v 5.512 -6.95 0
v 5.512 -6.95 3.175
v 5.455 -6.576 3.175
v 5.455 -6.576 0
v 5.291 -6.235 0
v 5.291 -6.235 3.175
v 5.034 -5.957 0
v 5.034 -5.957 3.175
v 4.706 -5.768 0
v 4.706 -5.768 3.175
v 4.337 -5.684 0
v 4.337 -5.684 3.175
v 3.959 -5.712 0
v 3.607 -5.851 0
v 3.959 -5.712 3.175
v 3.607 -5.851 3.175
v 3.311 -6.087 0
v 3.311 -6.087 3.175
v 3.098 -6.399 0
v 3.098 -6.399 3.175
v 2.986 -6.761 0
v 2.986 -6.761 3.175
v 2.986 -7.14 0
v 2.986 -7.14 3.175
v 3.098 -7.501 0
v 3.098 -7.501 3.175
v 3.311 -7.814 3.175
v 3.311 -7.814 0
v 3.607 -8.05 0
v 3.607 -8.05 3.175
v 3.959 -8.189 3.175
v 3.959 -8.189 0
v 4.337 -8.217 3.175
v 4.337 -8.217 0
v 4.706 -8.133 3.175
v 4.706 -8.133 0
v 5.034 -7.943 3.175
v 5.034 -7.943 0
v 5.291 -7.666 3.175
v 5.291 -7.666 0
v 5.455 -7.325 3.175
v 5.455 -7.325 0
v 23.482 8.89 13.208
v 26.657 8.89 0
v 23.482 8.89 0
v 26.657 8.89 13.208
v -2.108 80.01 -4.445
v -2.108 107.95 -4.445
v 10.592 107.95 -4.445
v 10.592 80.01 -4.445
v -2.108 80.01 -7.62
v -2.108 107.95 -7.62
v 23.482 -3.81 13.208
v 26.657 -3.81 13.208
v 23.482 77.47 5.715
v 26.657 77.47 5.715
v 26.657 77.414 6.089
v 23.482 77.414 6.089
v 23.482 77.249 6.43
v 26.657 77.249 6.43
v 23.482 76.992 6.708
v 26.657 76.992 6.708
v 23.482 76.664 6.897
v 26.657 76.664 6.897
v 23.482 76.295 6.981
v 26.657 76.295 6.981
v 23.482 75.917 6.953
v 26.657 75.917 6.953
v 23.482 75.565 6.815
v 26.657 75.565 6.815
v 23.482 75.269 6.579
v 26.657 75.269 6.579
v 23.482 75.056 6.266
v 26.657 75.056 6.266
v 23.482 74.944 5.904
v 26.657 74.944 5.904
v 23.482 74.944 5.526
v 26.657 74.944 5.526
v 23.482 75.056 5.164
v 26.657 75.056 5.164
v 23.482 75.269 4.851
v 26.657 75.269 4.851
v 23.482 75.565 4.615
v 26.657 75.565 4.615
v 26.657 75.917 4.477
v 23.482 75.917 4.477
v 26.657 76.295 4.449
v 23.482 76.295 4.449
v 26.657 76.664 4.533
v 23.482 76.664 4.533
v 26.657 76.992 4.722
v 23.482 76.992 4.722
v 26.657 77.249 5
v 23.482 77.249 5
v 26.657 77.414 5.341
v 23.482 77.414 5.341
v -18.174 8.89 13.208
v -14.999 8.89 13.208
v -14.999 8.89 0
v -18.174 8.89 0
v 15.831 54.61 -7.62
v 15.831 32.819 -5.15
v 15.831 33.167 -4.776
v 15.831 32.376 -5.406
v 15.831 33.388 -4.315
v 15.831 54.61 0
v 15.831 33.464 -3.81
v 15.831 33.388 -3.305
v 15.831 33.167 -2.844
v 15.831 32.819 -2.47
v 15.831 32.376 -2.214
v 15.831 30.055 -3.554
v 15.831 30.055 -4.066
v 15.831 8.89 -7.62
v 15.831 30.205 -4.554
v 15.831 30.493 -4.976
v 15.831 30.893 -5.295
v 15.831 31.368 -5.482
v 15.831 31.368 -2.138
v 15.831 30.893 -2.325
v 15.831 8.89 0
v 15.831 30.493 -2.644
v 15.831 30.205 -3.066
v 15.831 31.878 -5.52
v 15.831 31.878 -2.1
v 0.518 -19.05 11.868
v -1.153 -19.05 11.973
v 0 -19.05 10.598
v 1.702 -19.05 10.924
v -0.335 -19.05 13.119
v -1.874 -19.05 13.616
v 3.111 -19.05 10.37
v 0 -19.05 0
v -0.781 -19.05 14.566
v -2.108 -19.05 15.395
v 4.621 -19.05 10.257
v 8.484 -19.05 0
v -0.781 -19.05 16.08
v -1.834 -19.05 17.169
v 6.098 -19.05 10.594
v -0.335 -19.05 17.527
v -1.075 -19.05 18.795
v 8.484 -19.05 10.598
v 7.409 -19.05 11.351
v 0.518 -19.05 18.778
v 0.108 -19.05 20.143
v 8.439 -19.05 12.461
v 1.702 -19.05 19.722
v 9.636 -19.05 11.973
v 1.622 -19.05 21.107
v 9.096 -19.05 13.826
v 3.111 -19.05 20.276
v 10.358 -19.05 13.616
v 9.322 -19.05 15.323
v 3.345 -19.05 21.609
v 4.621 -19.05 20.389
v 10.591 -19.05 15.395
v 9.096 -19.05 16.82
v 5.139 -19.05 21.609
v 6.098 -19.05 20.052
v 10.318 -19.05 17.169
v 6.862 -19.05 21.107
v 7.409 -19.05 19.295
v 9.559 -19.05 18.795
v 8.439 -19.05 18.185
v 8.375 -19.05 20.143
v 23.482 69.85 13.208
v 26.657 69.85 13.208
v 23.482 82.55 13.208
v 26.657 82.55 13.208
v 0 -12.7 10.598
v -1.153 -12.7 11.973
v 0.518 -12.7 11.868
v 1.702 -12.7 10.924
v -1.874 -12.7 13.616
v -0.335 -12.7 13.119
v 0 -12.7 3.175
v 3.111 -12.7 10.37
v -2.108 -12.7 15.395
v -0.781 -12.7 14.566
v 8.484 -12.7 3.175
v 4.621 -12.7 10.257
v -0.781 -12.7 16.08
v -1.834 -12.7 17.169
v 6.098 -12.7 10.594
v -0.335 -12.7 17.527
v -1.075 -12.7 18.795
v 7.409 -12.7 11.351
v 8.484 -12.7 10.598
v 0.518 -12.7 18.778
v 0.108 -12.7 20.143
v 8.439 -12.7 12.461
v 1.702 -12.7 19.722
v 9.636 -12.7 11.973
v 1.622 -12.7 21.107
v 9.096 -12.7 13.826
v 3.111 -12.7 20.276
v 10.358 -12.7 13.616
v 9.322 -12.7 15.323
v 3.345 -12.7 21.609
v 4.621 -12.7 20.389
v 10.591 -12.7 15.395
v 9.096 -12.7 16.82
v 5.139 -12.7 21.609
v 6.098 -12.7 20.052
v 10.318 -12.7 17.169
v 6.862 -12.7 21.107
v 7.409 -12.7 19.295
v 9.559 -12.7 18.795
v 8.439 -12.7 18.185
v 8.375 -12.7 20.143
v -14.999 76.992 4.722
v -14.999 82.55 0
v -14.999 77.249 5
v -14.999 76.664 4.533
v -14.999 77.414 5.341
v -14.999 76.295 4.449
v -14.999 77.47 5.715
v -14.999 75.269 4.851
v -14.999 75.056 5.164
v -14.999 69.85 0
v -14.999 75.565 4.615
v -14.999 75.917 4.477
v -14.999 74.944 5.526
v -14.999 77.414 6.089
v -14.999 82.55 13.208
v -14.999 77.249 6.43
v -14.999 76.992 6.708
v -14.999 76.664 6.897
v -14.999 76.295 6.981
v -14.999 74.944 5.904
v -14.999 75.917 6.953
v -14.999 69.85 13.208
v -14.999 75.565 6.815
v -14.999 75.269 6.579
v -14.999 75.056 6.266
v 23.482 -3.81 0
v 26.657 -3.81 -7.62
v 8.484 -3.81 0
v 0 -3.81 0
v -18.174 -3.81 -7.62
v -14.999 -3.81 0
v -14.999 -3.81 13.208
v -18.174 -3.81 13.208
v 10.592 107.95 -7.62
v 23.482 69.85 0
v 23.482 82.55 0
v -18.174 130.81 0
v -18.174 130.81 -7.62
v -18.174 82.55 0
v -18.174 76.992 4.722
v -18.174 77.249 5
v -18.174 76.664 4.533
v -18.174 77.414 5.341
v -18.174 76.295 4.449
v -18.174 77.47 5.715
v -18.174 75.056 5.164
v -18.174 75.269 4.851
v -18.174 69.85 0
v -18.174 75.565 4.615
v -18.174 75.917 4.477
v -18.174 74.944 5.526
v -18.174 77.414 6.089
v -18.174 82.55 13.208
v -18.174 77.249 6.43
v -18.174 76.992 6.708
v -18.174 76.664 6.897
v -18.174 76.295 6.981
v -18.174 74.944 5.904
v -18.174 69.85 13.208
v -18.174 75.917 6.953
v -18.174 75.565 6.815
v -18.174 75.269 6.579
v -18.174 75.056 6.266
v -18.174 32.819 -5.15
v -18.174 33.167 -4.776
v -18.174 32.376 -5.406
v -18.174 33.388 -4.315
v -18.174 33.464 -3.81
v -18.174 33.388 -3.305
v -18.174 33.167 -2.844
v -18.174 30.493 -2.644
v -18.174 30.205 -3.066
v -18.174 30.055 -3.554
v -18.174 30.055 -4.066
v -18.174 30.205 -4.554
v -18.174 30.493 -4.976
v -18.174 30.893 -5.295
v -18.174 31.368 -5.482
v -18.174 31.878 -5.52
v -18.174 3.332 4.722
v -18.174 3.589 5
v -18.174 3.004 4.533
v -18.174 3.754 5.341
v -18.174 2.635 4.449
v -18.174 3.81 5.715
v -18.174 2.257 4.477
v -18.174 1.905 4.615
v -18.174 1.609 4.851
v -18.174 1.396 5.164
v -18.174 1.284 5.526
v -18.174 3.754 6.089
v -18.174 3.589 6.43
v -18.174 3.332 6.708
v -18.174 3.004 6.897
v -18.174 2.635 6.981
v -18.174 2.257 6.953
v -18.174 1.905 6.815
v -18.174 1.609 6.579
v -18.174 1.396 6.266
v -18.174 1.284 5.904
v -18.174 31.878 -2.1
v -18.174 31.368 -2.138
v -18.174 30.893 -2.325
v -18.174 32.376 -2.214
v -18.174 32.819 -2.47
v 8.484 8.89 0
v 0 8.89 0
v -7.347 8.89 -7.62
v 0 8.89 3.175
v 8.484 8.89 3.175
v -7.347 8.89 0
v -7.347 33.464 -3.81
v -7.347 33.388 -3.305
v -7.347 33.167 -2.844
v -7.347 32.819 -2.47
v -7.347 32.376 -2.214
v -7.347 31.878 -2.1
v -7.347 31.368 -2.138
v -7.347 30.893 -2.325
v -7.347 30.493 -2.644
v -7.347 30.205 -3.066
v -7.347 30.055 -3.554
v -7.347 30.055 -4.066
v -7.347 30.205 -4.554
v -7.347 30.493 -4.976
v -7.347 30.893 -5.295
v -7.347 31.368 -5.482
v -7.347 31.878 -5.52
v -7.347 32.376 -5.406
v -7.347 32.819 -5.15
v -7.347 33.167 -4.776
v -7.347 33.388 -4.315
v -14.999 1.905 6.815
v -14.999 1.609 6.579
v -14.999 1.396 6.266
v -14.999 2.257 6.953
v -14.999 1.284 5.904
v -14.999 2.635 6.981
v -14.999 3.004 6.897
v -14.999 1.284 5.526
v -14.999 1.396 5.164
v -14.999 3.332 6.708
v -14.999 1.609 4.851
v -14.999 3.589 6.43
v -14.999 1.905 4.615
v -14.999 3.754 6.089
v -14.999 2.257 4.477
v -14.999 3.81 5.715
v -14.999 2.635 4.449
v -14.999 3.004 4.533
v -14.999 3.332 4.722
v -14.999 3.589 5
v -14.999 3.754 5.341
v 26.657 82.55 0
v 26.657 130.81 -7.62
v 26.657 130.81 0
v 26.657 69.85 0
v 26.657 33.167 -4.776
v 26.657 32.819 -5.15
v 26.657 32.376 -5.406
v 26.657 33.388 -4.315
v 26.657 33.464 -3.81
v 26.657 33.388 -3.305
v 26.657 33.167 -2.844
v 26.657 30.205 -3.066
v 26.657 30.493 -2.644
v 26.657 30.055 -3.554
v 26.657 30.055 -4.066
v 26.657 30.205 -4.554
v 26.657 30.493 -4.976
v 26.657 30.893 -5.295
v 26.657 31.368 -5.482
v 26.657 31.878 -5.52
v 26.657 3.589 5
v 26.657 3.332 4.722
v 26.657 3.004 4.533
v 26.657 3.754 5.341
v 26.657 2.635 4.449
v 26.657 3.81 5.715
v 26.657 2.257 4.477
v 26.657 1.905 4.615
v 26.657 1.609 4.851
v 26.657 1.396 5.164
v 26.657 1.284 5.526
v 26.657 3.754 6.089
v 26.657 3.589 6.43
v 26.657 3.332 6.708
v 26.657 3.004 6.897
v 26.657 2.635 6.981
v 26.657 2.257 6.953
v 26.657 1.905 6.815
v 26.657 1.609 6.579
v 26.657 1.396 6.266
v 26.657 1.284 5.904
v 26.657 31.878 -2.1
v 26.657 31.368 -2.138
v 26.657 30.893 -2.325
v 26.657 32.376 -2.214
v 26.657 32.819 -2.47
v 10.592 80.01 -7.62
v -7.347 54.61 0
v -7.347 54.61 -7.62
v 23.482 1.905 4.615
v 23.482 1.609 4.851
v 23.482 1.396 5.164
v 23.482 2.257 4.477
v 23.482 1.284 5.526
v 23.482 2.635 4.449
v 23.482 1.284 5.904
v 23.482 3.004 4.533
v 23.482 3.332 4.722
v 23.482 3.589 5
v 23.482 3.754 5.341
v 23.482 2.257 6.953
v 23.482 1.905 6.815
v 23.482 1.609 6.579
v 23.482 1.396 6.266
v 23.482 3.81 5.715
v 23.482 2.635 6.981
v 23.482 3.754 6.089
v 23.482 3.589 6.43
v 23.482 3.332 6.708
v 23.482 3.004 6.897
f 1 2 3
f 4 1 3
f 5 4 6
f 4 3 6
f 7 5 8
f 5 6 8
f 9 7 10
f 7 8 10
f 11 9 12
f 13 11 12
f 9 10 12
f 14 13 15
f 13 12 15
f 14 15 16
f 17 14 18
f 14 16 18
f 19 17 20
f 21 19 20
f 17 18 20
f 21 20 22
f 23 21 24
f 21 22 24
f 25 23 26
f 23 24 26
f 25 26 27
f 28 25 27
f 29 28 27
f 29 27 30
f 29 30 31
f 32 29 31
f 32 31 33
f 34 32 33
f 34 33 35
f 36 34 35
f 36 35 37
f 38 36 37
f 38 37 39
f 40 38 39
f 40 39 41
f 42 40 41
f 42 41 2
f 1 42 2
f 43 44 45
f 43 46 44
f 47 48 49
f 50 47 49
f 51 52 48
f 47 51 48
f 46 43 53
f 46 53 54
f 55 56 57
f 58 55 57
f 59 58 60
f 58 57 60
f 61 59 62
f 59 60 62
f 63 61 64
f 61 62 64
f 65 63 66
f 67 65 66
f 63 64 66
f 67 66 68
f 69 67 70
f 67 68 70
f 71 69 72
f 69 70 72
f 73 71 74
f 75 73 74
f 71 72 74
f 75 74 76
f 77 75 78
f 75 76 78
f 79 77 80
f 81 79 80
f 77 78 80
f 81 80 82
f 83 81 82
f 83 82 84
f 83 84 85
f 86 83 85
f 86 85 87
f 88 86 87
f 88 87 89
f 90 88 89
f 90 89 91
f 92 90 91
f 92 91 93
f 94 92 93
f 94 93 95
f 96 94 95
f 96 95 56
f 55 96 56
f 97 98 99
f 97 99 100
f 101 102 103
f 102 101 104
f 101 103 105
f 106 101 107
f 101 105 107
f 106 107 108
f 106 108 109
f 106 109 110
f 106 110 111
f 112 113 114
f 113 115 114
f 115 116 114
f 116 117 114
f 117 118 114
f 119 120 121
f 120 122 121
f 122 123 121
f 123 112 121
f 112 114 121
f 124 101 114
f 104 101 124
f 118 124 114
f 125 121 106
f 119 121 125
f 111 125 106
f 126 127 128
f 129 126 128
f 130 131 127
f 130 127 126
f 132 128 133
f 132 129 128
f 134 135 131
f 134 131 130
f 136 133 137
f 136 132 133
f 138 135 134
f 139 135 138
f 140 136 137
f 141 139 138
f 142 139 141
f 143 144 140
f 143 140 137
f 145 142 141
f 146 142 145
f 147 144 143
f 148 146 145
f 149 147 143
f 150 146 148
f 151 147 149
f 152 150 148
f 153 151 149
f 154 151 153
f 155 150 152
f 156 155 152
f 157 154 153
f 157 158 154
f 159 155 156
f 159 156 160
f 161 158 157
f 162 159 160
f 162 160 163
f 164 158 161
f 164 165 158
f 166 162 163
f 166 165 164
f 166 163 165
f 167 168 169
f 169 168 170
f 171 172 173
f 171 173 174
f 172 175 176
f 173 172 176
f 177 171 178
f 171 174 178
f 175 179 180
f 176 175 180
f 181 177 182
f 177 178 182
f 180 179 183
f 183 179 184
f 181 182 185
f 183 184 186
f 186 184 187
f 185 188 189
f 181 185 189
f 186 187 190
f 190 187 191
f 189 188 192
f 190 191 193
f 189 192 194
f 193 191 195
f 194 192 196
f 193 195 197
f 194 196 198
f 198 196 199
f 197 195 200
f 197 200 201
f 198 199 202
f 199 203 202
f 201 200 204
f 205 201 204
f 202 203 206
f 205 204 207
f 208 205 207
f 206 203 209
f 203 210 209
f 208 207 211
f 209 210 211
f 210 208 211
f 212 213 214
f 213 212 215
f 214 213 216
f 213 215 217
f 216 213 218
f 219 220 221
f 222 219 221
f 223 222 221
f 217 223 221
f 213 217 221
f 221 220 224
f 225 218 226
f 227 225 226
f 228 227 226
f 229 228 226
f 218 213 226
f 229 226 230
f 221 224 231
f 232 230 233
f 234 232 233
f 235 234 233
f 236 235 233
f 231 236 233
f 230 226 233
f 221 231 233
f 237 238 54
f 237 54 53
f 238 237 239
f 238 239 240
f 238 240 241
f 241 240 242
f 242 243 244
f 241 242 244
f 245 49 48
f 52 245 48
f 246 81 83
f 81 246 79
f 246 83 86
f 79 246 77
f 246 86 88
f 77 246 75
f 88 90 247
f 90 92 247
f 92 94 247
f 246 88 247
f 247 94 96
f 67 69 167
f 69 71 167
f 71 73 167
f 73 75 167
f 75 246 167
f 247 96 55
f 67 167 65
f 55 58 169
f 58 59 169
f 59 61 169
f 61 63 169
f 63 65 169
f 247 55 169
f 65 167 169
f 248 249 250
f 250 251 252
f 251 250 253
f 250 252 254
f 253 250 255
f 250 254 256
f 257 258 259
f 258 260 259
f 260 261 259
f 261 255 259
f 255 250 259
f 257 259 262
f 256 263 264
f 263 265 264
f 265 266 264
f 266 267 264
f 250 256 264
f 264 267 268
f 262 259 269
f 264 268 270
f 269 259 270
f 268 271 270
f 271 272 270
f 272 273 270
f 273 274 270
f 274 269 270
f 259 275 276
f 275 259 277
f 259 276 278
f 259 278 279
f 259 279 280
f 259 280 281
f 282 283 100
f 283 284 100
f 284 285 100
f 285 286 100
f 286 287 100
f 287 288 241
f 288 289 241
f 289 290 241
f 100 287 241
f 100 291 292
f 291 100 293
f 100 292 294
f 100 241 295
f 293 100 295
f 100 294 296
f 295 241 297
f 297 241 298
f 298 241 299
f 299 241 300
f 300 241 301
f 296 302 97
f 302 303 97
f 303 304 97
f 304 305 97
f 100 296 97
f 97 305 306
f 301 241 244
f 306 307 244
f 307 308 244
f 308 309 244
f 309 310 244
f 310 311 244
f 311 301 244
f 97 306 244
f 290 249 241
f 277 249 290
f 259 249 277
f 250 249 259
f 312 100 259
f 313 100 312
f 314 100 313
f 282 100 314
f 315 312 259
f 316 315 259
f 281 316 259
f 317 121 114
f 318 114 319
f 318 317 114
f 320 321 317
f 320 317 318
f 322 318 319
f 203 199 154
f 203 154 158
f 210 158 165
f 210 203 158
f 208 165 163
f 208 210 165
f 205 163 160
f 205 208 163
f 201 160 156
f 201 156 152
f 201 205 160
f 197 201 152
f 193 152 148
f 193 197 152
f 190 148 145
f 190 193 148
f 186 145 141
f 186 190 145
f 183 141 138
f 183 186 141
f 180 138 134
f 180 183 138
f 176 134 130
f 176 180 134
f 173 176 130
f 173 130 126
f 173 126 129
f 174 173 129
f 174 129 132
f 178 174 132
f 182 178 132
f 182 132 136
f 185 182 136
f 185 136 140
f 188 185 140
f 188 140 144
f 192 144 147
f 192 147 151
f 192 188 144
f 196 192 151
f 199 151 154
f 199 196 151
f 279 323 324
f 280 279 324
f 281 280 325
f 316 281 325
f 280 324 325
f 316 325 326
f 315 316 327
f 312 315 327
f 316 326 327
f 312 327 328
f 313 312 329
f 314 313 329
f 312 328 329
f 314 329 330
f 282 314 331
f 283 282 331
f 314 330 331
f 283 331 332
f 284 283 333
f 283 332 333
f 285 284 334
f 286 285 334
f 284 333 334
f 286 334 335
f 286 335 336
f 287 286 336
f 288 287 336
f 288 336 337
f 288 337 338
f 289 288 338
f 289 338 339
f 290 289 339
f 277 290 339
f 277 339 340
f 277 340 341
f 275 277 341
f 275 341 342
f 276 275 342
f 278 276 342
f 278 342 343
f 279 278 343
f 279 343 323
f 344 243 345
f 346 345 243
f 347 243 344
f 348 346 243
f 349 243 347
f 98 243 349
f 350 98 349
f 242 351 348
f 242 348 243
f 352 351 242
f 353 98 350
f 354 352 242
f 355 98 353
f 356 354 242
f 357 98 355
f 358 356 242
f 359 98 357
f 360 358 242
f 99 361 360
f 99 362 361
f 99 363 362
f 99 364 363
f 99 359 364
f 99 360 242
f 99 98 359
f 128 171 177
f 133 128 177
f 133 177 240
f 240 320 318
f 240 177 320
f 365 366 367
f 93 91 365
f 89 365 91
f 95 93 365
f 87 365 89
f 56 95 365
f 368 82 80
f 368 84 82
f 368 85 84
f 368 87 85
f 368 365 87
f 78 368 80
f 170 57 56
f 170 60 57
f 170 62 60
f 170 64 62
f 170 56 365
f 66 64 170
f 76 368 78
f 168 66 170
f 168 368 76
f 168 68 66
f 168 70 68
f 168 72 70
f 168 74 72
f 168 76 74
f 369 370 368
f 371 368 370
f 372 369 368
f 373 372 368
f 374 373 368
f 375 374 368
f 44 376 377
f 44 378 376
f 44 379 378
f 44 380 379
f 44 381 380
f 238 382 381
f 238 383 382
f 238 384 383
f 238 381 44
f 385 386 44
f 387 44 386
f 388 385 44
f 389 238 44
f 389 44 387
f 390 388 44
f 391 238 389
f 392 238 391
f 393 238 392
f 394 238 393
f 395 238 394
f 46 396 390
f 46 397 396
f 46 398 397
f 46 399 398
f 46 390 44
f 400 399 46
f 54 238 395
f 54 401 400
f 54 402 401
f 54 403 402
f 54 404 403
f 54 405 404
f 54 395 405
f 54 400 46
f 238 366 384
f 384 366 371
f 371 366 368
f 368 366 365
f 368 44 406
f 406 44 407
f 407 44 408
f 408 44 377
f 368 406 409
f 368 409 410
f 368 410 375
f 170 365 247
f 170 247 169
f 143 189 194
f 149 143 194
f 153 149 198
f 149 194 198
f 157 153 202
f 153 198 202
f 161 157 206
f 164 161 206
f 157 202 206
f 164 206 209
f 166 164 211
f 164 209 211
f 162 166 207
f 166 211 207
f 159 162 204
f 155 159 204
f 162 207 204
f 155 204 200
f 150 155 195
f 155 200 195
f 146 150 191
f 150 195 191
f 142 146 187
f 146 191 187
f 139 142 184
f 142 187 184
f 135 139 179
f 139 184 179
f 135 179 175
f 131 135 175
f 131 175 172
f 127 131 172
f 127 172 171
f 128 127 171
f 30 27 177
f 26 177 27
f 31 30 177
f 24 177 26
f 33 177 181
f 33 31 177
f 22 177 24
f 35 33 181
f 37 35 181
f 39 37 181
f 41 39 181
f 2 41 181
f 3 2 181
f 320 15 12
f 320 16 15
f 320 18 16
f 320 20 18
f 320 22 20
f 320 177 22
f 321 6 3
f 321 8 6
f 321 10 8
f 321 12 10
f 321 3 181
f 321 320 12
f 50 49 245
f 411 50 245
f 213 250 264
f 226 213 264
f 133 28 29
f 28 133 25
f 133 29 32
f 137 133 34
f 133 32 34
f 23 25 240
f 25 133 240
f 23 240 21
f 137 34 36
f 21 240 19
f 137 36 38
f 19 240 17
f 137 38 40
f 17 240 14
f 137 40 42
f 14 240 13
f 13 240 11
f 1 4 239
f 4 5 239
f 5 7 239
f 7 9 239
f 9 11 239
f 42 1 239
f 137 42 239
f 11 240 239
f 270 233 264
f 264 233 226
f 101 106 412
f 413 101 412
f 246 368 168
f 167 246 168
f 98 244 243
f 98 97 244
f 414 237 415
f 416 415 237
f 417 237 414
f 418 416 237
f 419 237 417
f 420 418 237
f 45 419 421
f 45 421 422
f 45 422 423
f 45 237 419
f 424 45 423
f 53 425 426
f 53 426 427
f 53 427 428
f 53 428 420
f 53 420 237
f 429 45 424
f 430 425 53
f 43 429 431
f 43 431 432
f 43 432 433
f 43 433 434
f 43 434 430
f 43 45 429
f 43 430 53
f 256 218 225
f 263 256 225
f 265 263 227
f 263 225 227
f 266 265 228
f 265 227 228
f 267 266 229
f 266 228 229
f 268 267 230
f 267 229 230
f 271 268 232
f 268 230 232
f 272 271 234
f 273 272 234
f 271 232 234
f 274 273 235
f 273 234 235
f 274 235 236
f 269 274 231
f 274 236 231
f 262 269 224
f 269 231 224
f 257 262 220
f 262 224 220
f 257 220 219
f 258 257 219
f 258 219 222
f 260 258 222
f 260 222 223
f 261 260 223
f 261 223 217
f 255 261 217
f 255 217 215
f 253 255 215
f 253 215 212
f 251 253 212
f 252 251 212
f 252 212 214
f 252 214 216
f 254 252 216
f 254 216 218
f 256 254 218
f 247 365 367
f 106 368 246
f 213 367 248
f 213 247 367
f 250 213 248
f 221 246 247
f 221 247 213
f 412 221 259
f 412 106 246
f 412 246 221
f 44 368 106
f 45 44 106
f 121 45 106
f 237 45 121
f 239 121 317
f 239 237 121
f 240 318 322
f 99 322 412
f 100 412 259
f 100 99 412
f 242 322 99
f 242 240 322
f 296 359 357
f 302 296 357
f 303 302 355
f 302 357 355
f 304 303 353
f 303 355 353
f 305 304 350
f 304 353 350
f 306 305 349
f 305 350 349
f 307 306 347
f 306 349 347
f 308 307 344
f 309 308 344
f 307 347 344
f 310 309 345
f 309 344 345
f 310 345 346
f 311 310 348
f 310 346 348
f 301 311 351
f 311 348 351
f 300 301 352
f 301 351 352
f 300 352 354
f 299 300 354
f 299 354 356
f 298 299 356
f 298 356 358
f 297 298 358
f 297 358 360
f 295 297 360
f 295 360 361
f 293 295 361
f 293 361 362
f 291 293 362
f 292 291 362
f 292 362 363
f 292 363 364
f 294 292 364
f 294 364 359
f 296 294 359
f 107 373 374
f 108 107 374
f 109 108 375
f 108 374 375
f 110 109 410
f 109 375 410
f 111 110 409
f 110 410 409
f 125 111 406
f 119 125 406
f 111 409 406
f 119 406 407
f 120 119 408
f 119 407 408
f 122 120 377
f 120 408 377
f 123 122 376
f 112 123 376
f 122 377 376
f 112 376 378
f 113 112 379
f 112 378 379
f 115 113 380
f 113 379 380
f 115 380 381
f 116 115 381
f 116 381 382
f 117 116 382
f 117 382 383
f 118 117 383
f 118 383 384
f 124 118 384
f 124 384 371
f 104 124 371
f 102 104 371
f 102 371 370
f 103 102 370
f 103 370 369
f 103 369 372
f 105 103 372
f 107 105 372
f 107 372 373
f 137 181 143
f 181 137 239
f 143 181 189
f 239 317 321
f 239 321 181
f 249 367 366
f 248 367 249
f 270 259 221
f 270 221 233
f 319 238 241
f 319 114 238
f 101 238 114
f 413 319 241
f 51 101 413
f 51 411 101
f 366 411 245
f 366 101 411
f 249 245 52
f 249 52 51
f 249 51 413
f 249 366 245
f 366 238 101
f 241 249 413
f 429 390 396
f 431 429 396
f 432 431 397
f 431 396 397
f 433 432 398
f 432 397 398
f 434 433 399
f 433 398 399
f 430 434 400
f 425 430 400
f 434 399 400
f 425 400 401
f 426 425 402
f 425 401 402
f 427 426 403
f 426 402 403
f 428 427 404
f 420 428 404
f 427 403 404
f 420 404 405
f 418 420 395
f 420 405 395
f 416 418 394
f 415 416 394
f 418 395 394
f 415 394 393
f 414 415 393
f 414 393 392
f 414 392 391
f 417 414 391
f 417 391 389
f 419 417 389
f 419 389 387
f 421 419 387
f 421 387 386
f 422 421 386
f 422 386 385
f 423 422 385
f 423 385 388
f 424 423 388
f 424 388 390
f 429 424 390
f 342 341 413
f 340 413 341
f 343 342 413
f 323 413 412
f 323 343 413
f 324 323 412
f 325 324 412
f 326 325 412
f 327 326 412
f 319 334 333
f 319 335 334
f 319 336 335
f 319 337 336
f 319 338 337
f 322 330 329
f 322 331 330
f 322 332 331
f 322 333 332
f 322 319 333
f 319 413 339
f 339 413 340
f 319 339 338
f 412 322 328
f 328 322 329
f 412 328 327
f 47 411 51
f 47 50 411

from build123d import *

# Parameters (mm, degrees)
F0_W          = 8.4836
F0_H          = 3.175
F1_DEPTH      = 12.7
F3_DEPTH      = 8.89
F3_DEPTH_BACK = 3.81
F4_R          = 5.08
F5_DEPTH      = 6.35
F6_R          = 1.27
F7_DEPTH      = 25.4
F8_R          = 1.27
F9_DEPTH      = 124.4092
F10_W         = 10.82675
F10_H         = 7.62
F11_DEPTH     = 45.72
F12_W         = 44.831
F12_H         = 7.62
F13_DEPTH     = 76.2
F14_R         = 1.7145
F15_DEPTH     = 51.6382
F16_W         = 12.7
F16_H         = 14.986
F17_DEPTH     = 3.175
F18_W         = 12.7
F18_H         = 14.986
F19_DEPTH     = 3.175
F20_W         = 12.7
F20_H         = 1.778
F20_R         = 1.27
F21_DEPTH     = 51.054
F23_DEPTH     = 50.8
F24_W         = 12.7
F24_H         = 3.175
F25_DEPTH     = 22.86


with BuildPart() as f1:
    # F0 (on Front) → F1 (new body)
    with BuildSketch(Plane.XZ):
        with Locations((4.2418, 1.5875)):
            Rectangle(F0_W, F0_H)
    extrude(amount=F1_DEPTH)

    # F2 (on face) → F3 (join, two sides)
    with BuildSketch(Plane(origin=(0, 0, 0), x_dir=(-1, 0, 0), z_dir=(0, 1, 0))) as f3_sk:
        Polygon((-8.4836, 3.175), (-8.4836, 0), (-13.7668, 0), (-23.4823, 0), (-23.4823, 13.208), (-26.6573, 13.208), (-26.6573, -7.62), (-12.1793, -7.62), (-4.2418, -7.62), (3.6957, -7.62), (18.1737, -7.62), (18.1737, 13.208), (14.9987, 13.208), (14.9987, 0), (5.2832, 0), (0, 0), (0, 3.175), align=None)
    extrude(amount=F3_DEPTH)
    extrude(f3_sk.sketch, amount=-F3_DEPTH_BACK)

    # F4 (on face) → F5 (join)
    with BuildSketch(Plane.XZ.offset(12.7)):
        with BuildLine():
            Line((8.4836, 0), (8.4836, 10.59766))
            ThreePointArc((8.4836, 10.59766), (4.2418, 21.673084), (0, 10.59766))
            Line((0, 10.59766), (0, 0))
            Line((0, 0), (8.4836, 0))
        make_face()
        with Locations((4.2418, 15.323084)):
            Circle(F4_R, mode=Mode.SUBTRACT)
    extrude(amount=F5_DEPTH)

    # F6 (on face) → F7 (cut)
    with BuildSketch(Plane.XY.offset(3.175)):
        with Locations((4.2418, -6.95039)):
            Circle(F6_R)
    extrude(amount=-F7_DEPTH, mode=Mode.SUBTRACT)

    # F8 (on face) → F9 (cut)
    with BuildSketch(Plane.YZ.offset(26.6573)):
        with Locations((2.54, 5.715)):
            Circle(F8_R)
    extrude(amount=-F9_DEPTH, mode=Mode.SUBTRACT)

    # F10 (on face) → F11 (join)
    with BuildSketch(Plane(origin=(0, 8.89, 0), x_dir=(-1, 0, 0), z_dir=(0, 1, 0))):
        with Locations((-21.243925, -3.81)):
            Rectangle(F10_W, F10_H)
        with Locations((12.760325, -3.81)):
            Rectangle(F10_W, F10_H)
    extrude(amount=F11_DEPTH)

    # F12 (on face) → F13 (join)
    with BuildSketch(Plane(origin=(0, 54.61, 0), x_dir=(-1, 0, 0), z_dir=(0, 1, 0))):
        with Locations((-4.2418, -3.81)):
            Rectangle(F12_W, F12_H)
    extrude(amount=F13_DEPTH)

    # F14 (on face) → F15 (cut)
    with BuildSketch(Plane.YZ.offset(26.6573)):
        with Locations((31.75, -3.81)):
            Circle(F14_R)
    extrude(amount=-F15_DEPTH, mode=Mode.SUBTRACT)

    # F16 (on face) → F17 (join)
    with BuildSketch(Plane.YZ.offset(26.6573)):
        with Locations((76.2, 7.493)):
            Rectangle(F16_W, F16_H)
    extrude(amount=-F17_DEPTH)

    # F18 (on face) → F19 (join)
    with BuildSketch(Plane(origin=(-18.1737, 0, 0), x_dir=(0, -1, 0), z_dir=(-1, 0, 0))):
        with Locations((-76.2, 7.493)):
            Rectangle(F18_W, F18_H)
    extrude(amount=-F19_DEPTH)

    # F20 (on face) → F21 (cut)
    with BuildSketch(Plane.YZ.offset(26.6573)):
        with Locations((76.2, 14.097)):
            Rectangle(F20_W, F20_H)
        with Locations((76.2, 5.715)):
            Circle(F20_R)
    extrude(amount=-F21_DEPTH, mode=Mode.SUBTRACT)

    # F22 (on face) → F23 (cut)
    with BuildSketch(Plane(origin=(0, 130.81, 0), x_dir=(-1, 0, 0), z_dir=(0, 1, 0))):
        Polygon((-10.5918, -7.62), (-4.2418, -7.62), (2.1082, -7.62), (2.1082, -4.445), (-10.5918, -4.445), align=None)
    extrude(amount=-F23_DEPTH, mode=Mode.SUBTRACT)

    # F24 (on face) → F25 (join)
    with BuildSketch(Plane(origin=(0, 130.81, 0), x_dir=(-1, 0, 0), z_dir=(0, 1, 0))):
        with Locations((-4.2418, -6.0325)):
            Rectangle(F24_W, F24_H)
    extrude(amount=-F25_DEPTH)


solid = f1.part
